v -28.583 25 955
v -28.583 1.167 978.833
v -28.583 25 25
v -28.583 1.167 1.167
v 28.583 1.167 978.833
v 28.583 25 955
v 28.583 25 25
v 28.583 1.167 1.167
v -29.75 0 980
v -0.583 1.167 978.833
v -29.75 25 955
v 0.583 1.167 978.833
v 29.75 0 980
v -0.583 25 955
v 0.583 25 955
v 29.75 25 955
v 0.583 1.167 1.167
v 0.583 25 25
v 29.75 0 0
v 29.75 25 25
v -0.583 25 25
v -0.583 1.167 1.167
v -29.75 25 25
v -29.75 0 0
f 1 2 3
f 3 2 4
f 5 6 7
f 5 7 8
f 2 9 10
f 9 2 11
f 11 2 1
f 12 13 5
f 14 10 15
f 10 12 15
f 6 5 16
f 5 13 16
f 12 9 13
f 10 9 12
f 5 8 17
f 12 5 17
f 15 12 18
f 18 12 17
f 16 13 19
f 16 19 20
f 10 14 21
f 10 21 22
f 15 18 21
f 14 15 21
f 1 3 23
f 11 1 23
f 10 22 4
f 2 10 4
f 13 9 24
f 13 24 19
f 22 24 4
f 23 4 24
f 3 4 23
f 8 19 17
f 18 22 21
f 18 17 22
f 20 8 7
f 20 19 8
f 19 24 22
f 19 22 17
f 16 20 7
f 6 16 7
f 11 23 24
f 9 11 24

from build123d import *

# Parameters (mm, degrees)
PAD_DEPTH       = 980
POCKET_DEPTH    = 59.501
POCKET001_DEPTH = 59.501


with BuildPart() as part:
    # Sketch → Pad (new body)
    with BuildSketch(Plane.XY):
        Polygon((-29.75, 25), (-29.75, 0), (29.75, 0), (29.75, 25), (28.583333, 25), (28.583333, 1.166667), (0.583333, 1.166667), (0.583333, 25), (-0.583333, 25), (-0.583333, 1.166667), (-28.583333, 1.166667), (-28.583333, 25), align=None)
    extrude(amount=PAD_DEPTH)

    # Sketch001 (on Face3 of Pad) → Pocket (cut, through all)
    with BuildSketch(Plane.YZ.offset(29.75)):
        Polygon((0, 0), (25, 25), (25, 0), align=None)
    extrude(amount=-POCKET_DEPTH, mode=Mode.SUBTRACT)

    # Sketch002 (on Face6 of Pocket) → Pocket001 (cut, through all)
    with BuildSketch(Plane.YZ.offset(29.75)):
        Polygon((0, 980), (25, 955), (25, 980), align=None)
    extrude(amount=-POCKET001_DEPTH, mode=Mode.SUBTRACT)


solid = part.part
